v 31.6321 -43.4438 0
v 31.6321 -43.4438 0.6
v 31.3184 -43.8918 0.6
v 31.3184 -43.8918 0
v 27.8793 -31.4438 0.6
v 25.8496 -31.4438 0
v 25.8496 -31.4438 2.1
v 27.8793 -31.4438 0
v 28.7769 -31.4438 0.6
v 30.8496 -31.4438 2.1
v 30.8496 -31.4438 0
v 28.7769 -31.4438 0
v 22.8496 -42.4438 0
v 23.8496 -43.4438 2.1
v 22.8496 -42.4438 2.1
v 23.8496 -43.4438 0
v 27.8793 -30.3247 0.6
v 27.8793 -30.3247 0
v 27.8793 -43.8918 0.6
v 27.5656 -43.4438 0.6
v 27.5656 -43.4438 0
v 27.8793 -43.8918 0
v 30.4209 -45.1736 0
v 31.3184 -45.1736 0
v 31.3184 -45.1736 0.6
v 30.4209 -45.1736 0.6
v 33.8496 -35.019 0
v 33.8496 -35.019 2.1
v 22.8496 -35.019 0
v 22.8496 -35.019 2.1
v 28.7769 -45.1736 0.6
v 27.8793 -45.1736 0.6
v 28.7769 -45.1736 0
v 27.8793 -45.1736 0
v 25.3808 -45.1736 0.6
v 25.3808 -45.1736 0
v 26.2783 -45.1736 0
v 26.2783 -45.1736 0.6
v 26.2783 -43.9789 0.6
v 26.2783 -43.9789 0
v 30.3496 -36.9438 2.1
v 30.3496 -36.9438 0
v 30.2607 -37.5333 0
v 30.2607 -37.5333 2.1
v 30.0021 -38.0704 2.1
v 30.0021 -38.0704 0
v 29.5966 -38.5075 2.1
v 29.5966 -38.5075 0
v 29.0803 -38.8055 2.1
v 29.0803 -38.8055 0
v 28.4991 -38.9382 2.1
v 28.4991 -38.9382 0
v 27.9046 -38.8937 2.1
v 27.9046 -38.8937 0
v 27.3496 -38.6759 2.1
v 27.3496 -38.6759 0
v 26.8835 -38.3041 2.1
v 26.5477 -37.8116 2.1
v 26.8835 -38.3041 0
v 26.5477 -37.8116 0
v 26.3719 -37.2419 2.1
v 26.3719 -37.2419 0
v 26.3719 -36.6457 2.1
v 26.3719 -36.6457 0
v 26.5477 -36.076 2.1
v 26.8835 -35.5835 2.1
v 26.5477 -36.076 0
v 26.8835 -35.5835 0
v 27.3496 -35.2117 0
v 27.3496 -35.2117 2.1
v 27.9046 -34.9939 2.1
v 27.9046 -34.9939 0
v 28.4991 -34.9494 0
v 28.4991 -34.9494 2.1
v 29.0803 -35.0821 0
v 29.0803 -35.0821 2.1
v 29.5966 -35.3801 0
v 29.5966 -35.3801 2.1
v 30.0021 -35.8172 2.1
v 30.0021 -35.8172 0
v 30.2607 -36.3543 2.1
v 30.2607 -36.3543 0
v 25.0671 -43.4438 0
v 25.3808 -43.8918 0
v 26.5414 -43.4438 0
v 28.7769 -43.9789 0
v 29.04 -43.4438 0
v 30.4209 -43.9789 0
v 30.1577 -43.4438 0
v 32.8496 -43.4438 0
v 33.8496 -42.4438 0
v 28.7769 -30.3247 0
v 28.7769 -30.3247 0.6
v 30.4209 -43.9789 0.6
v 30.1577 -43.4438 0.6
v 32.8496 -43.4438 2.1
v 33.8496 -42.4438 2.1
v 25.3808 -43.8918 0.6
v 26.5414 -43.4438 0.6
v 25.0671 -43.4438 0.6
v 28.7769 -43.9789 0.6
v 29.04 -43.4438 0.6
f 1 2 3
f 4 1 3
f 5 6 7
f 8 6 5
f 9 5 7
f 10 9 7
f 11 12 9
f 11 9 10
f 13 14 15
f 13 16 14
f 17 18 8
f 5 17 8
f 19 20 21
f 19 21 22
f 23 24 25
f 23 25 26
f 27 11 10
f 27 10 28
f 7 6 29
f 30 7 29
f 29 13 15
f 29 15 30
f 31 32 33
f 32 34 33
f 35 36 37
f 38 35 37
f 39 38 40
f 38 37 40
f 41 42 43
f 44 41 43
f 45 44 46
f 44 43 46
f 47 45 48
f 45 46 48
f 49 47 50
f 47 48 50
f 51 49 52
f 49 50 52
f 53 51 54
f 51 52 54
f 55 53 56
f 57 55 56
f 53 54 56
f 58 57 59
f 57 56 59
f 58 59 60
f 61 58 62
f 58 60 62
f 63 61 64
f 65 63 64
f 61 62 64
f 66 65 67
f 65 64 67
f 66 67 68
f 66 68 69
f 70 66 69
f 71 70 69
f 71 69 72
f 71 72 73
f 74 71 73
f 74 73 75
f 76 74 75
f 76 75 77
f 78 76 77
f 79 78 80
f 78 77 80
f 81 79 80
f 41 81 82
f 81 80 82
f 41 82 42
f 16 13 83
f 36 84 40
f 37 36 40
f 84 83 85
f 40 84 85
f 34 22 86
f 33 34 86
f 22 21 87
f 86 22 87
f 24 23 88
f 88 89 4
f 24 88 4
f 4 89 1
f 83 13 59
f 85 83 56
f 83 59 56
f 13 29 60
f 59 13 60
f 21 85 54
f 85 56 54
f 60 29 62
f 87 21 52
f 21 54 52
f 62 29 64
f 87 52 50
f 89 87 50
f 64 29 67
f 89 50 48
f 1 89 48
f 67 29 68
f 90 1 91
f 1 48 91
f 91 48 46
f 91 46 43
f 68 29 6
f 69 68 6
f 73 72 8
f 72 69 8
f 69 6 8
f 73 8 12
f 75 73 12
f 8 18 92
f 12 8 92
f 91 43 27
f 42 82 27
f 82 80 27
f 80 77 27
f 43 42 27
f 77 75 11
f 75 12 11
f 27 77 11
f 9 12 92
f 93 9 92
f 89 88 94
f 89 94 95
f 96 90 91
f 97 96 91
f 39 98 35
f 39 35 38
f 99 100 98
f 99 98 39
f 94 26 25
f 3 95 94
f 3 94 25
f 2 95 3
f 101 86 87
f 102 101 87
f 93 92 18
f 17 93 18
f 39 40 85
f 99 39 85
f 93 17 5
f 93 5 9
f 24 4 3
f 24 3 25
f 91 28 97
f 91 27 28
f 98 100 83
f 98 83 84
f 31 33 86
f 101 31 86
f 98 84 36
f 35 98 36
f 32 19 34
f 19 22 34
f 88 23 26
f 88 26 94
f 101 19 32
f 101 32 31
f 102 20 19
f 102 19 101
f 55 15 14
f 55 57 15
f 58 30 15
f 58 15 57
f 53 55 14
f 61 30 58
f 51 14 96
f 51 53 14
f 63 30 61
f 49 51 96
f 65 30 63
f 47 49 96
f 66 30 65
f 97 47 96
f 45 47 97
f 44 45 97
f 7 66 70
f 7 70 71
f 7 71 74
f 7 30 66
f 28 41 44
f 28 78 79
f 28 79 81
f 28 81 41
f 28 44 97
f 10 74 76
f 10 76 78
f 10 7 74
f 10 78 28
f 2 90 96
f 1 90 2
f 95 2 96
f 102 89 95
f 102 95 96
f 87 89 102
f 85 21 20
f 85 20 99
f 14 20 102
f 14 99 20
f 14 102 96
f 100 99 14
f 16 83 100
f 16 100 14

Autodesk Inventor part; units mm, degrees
ref_plane "YZ Plane" through (0, 0, 0) normal (1, 0, 0) x (0, 1, 0)
ref_plane "XZ Plane" through (0, 0, 0) normal (0, 1, 0) x (-1, 0, 0)
ref_plane "XY Plane" through (0, 0, 0) normal (0, 0, 1) x (1, 0, 0)
sketch "Sketch1" plane through (0, 0, 0) normal (0, 0, 1) x (1, 0, 0)
  line L0 (10.2242, -22.1045) -> (46.869, -22.1045) construction
  line L1 (46.869, -22.1045) -> (46.869, -51.7203) construction
  line L2 (46.869, -51.7203) -> (10.2242, -51.7203) construction
  line L3 (10.2242, -51.7203) -> (10.2242, -22.1045) construction
  line L4 (29.8676, -31.4438) -> (29.8676, -43.4438) construction
  line L5 (33.8496, -35.029) -> (33.8496, -42.667)
  line L6 (33.8496, -42.667) -> (33.8496, -43.4438)
  line L7 (33.8496, -43.4438) -> (32.8496, -43.4438)
  line L8 (22.8496, -43.4438) -> (22.8496, -42.4438)
  line L9 (22.8496, -31.4438) -> (25.8496, -31.4438)
  line L10 (33.8496, -31.4438) -> (33.8496, -35.019)
  line L11 (28.3496, -31.4438) -> (28.3496, -43.4438) construction
  line L12 (28.3496, -31.4438) -> (25.8496, -31.4438)
  line L13 (25.8496, -31.4438) -> (22.8496, -35.019)
  line L14 (28.3496, -43.4438) -> (23.8496, -43.4438)
  line L15 (23.8496, -43.4438) -> (22.8496, -42.4438)
  line L16 (30.8496, -31.4438) -> (33.8496, -35.019)
  line L17 (32.8496, -43.4438) -> (33.8496, -42.4438)
  line L18 (25.8496, -31.4438) -> (30.8496, -31.4438)
  line L19 (22.8496, -35.019) -> (22.8496, -31.4438)
  line L20 (23.8496, -43.4438) -> (22.8496, -43.4438)
  line L21 (22.8496, -42.4438) -> (22.8496, -35.019)
  line L22 (32.8496, -43.4438) -> (23.8496, -43.4438)
  line L23 (33.8496, -43.4438) -> (33.8496, -43.6998)
  line L24 (33.8496, -42.4438) -> (33.8496, -43.4438)
  line L25 (33.8496, -35.019) -> (33.8496, -42.4438)
  line L26 (30.8496, -31.4438) -> (33.8496, -31.4438)
  circle A0 centre (28.3496, -36.9438) radius 2
  line L27 (26.6175, -35.9438) -> (30.0816, -35.9438)
  line L28 (25.0671, -43.4438) -> (25.3808, -43.8918)
  line L29 (25.0671, -43.4438) -> (25.614, -43.4438) construction
  line L30 (25.3808, -43.8918) -> (25.3808, -45.1736)
  line L31 (25.3808, -45.1736) -> (26.2783, -45.1736)
  line L32 (26.2783, -45.1736) -> (26.2783, -43.9789)
  line L33 (26.2783, -43.9789) -> (26.5414, -43.4438)
  line L34 (27.5656, -43.4438) -> (27.8793, -43.8918)
  line L35 (27.8793, -43.8918) -> (27.8793, -45.1736)
  line L36 (27.8793, -45.1736) -> (28.7769, -45.1736)
  line L37 (28.7769, -45.1736) -> (28.7769, -43.9789)
  line L38 (28.7769, -43.9789) -> (29.04, -43.4438)
  line L39 (31.6321, -43.4438) -> (31.3184, -43.8918)
  line L40 (31.3184, -43.8918) -> (31.3184, -45.1736)
  line L41 (31.3184, -45.1736) -> (30.4209, -45.1736)
  line L42 (30.4209, -45.1736) -> (30.4209, -43.9789)
  line L43 (30.4209, -43.9789) -> (30.1577, -43.4438)
  line L44 (31.6321, -43.4438) -> (31.3184, -43.8918)
  line L45 (31.3184, -43.8918) -> (31.3184, -45.1736)
  line L46 (31.3184, -45.1736) -> (30.4209, -45.1736)
  line L47 (30.4209, -45.1736) -> (30.4209, -43.9789)
  line L48 (30.4209, -43.9789) -> (30.1577, -43.4438)
  line L49 (31.6321, -43.4438) -> (31.3184, -43.8918)
  line L50 (31.3184, -43.8918) -> (31.3184, -45.1736)
  line L51 (31.3184, -45.1736) -> (30.4209, -45.1736)
  line L52 (30.4209, -45.1736) -> (30.4209, -43.9789)
  line L53 (30.4209, -43.9789) -> (30.1577, -43.4438)
  line L54 (28.7769, -30.3247) -> (27.8793, -30.3247)
  line L55 (27.8793, -30.3247) -> (27.8793, -31.4438)
  line L56 (27.8793, -31.4438) -> (28.7769, -31.4438)
  line L57 (28.7769, -31.4438) -> (28.7769, -30.3247)
  point P0 (0, 0)
  dimension "d1" = 12
  dimension "d57" = 11
  dimension "d58" = 2.5
  dimension "d59" = 130
  dimension "d60" = 4.5
  dimension "d61" = 135
  dimension "d66" = 4
  dimension "d69" = 6.5
  dimension "d70" = 3
  dimension "d71" = 55
extrude "Extrusion1" add sketch "Sketch1" along normal blind 2.1 contours L5 L17 L22 L14 L15 L21 L13 L12 L18 L16 L25 | L39 L40 L41 L42 L43 L22 | L18 L12 L55 L54 L57 | L38 L37 L36 L35 L34 L14 L22 | L33 L32 L31 L30 L28 L14
sketch "Sketch2" plane through (0, 0, 2.1) normal (0, 0, 1) x (1, 0, 0)
  line L0 (23.8496, -43.4438) -> (25.0671, -43.4438) projected
  line L1 (25.0671, -43.4438) -> (32.3568, -43.4438)
  line L2 (32.3568, -43.4438) -> (32.3568, -45.6215)
  line L3 (32.3568, -45.6215) -> (25.0671, -45.6215)
  line L4 (25.0671, -45.6215) -> (25.0671, -43.4438)
  line L5 (27.8793, -30.3247) -> (27.8793, -31.4438) projected
  line L6 (28.7769, -31.4438) -> (28.7769, -30.3247) projected
  line L7 (27.8793, -31.4438) -> (28.7769, -31.4438)
  line L8 (28.7769, -31.4438) -> (28.7769, -30.3247)
  line L9 (28.7769, -30.3247) -> (27.8793, -30.3247)
  line L10 (27.8793, -30.3247) -> (27.8793, -31.4438)
  point P0 (0, 0)
extrude "Extrusion2" cut sketch "Sketch2" against normal blind 1.5
properties part number "mainbody"
